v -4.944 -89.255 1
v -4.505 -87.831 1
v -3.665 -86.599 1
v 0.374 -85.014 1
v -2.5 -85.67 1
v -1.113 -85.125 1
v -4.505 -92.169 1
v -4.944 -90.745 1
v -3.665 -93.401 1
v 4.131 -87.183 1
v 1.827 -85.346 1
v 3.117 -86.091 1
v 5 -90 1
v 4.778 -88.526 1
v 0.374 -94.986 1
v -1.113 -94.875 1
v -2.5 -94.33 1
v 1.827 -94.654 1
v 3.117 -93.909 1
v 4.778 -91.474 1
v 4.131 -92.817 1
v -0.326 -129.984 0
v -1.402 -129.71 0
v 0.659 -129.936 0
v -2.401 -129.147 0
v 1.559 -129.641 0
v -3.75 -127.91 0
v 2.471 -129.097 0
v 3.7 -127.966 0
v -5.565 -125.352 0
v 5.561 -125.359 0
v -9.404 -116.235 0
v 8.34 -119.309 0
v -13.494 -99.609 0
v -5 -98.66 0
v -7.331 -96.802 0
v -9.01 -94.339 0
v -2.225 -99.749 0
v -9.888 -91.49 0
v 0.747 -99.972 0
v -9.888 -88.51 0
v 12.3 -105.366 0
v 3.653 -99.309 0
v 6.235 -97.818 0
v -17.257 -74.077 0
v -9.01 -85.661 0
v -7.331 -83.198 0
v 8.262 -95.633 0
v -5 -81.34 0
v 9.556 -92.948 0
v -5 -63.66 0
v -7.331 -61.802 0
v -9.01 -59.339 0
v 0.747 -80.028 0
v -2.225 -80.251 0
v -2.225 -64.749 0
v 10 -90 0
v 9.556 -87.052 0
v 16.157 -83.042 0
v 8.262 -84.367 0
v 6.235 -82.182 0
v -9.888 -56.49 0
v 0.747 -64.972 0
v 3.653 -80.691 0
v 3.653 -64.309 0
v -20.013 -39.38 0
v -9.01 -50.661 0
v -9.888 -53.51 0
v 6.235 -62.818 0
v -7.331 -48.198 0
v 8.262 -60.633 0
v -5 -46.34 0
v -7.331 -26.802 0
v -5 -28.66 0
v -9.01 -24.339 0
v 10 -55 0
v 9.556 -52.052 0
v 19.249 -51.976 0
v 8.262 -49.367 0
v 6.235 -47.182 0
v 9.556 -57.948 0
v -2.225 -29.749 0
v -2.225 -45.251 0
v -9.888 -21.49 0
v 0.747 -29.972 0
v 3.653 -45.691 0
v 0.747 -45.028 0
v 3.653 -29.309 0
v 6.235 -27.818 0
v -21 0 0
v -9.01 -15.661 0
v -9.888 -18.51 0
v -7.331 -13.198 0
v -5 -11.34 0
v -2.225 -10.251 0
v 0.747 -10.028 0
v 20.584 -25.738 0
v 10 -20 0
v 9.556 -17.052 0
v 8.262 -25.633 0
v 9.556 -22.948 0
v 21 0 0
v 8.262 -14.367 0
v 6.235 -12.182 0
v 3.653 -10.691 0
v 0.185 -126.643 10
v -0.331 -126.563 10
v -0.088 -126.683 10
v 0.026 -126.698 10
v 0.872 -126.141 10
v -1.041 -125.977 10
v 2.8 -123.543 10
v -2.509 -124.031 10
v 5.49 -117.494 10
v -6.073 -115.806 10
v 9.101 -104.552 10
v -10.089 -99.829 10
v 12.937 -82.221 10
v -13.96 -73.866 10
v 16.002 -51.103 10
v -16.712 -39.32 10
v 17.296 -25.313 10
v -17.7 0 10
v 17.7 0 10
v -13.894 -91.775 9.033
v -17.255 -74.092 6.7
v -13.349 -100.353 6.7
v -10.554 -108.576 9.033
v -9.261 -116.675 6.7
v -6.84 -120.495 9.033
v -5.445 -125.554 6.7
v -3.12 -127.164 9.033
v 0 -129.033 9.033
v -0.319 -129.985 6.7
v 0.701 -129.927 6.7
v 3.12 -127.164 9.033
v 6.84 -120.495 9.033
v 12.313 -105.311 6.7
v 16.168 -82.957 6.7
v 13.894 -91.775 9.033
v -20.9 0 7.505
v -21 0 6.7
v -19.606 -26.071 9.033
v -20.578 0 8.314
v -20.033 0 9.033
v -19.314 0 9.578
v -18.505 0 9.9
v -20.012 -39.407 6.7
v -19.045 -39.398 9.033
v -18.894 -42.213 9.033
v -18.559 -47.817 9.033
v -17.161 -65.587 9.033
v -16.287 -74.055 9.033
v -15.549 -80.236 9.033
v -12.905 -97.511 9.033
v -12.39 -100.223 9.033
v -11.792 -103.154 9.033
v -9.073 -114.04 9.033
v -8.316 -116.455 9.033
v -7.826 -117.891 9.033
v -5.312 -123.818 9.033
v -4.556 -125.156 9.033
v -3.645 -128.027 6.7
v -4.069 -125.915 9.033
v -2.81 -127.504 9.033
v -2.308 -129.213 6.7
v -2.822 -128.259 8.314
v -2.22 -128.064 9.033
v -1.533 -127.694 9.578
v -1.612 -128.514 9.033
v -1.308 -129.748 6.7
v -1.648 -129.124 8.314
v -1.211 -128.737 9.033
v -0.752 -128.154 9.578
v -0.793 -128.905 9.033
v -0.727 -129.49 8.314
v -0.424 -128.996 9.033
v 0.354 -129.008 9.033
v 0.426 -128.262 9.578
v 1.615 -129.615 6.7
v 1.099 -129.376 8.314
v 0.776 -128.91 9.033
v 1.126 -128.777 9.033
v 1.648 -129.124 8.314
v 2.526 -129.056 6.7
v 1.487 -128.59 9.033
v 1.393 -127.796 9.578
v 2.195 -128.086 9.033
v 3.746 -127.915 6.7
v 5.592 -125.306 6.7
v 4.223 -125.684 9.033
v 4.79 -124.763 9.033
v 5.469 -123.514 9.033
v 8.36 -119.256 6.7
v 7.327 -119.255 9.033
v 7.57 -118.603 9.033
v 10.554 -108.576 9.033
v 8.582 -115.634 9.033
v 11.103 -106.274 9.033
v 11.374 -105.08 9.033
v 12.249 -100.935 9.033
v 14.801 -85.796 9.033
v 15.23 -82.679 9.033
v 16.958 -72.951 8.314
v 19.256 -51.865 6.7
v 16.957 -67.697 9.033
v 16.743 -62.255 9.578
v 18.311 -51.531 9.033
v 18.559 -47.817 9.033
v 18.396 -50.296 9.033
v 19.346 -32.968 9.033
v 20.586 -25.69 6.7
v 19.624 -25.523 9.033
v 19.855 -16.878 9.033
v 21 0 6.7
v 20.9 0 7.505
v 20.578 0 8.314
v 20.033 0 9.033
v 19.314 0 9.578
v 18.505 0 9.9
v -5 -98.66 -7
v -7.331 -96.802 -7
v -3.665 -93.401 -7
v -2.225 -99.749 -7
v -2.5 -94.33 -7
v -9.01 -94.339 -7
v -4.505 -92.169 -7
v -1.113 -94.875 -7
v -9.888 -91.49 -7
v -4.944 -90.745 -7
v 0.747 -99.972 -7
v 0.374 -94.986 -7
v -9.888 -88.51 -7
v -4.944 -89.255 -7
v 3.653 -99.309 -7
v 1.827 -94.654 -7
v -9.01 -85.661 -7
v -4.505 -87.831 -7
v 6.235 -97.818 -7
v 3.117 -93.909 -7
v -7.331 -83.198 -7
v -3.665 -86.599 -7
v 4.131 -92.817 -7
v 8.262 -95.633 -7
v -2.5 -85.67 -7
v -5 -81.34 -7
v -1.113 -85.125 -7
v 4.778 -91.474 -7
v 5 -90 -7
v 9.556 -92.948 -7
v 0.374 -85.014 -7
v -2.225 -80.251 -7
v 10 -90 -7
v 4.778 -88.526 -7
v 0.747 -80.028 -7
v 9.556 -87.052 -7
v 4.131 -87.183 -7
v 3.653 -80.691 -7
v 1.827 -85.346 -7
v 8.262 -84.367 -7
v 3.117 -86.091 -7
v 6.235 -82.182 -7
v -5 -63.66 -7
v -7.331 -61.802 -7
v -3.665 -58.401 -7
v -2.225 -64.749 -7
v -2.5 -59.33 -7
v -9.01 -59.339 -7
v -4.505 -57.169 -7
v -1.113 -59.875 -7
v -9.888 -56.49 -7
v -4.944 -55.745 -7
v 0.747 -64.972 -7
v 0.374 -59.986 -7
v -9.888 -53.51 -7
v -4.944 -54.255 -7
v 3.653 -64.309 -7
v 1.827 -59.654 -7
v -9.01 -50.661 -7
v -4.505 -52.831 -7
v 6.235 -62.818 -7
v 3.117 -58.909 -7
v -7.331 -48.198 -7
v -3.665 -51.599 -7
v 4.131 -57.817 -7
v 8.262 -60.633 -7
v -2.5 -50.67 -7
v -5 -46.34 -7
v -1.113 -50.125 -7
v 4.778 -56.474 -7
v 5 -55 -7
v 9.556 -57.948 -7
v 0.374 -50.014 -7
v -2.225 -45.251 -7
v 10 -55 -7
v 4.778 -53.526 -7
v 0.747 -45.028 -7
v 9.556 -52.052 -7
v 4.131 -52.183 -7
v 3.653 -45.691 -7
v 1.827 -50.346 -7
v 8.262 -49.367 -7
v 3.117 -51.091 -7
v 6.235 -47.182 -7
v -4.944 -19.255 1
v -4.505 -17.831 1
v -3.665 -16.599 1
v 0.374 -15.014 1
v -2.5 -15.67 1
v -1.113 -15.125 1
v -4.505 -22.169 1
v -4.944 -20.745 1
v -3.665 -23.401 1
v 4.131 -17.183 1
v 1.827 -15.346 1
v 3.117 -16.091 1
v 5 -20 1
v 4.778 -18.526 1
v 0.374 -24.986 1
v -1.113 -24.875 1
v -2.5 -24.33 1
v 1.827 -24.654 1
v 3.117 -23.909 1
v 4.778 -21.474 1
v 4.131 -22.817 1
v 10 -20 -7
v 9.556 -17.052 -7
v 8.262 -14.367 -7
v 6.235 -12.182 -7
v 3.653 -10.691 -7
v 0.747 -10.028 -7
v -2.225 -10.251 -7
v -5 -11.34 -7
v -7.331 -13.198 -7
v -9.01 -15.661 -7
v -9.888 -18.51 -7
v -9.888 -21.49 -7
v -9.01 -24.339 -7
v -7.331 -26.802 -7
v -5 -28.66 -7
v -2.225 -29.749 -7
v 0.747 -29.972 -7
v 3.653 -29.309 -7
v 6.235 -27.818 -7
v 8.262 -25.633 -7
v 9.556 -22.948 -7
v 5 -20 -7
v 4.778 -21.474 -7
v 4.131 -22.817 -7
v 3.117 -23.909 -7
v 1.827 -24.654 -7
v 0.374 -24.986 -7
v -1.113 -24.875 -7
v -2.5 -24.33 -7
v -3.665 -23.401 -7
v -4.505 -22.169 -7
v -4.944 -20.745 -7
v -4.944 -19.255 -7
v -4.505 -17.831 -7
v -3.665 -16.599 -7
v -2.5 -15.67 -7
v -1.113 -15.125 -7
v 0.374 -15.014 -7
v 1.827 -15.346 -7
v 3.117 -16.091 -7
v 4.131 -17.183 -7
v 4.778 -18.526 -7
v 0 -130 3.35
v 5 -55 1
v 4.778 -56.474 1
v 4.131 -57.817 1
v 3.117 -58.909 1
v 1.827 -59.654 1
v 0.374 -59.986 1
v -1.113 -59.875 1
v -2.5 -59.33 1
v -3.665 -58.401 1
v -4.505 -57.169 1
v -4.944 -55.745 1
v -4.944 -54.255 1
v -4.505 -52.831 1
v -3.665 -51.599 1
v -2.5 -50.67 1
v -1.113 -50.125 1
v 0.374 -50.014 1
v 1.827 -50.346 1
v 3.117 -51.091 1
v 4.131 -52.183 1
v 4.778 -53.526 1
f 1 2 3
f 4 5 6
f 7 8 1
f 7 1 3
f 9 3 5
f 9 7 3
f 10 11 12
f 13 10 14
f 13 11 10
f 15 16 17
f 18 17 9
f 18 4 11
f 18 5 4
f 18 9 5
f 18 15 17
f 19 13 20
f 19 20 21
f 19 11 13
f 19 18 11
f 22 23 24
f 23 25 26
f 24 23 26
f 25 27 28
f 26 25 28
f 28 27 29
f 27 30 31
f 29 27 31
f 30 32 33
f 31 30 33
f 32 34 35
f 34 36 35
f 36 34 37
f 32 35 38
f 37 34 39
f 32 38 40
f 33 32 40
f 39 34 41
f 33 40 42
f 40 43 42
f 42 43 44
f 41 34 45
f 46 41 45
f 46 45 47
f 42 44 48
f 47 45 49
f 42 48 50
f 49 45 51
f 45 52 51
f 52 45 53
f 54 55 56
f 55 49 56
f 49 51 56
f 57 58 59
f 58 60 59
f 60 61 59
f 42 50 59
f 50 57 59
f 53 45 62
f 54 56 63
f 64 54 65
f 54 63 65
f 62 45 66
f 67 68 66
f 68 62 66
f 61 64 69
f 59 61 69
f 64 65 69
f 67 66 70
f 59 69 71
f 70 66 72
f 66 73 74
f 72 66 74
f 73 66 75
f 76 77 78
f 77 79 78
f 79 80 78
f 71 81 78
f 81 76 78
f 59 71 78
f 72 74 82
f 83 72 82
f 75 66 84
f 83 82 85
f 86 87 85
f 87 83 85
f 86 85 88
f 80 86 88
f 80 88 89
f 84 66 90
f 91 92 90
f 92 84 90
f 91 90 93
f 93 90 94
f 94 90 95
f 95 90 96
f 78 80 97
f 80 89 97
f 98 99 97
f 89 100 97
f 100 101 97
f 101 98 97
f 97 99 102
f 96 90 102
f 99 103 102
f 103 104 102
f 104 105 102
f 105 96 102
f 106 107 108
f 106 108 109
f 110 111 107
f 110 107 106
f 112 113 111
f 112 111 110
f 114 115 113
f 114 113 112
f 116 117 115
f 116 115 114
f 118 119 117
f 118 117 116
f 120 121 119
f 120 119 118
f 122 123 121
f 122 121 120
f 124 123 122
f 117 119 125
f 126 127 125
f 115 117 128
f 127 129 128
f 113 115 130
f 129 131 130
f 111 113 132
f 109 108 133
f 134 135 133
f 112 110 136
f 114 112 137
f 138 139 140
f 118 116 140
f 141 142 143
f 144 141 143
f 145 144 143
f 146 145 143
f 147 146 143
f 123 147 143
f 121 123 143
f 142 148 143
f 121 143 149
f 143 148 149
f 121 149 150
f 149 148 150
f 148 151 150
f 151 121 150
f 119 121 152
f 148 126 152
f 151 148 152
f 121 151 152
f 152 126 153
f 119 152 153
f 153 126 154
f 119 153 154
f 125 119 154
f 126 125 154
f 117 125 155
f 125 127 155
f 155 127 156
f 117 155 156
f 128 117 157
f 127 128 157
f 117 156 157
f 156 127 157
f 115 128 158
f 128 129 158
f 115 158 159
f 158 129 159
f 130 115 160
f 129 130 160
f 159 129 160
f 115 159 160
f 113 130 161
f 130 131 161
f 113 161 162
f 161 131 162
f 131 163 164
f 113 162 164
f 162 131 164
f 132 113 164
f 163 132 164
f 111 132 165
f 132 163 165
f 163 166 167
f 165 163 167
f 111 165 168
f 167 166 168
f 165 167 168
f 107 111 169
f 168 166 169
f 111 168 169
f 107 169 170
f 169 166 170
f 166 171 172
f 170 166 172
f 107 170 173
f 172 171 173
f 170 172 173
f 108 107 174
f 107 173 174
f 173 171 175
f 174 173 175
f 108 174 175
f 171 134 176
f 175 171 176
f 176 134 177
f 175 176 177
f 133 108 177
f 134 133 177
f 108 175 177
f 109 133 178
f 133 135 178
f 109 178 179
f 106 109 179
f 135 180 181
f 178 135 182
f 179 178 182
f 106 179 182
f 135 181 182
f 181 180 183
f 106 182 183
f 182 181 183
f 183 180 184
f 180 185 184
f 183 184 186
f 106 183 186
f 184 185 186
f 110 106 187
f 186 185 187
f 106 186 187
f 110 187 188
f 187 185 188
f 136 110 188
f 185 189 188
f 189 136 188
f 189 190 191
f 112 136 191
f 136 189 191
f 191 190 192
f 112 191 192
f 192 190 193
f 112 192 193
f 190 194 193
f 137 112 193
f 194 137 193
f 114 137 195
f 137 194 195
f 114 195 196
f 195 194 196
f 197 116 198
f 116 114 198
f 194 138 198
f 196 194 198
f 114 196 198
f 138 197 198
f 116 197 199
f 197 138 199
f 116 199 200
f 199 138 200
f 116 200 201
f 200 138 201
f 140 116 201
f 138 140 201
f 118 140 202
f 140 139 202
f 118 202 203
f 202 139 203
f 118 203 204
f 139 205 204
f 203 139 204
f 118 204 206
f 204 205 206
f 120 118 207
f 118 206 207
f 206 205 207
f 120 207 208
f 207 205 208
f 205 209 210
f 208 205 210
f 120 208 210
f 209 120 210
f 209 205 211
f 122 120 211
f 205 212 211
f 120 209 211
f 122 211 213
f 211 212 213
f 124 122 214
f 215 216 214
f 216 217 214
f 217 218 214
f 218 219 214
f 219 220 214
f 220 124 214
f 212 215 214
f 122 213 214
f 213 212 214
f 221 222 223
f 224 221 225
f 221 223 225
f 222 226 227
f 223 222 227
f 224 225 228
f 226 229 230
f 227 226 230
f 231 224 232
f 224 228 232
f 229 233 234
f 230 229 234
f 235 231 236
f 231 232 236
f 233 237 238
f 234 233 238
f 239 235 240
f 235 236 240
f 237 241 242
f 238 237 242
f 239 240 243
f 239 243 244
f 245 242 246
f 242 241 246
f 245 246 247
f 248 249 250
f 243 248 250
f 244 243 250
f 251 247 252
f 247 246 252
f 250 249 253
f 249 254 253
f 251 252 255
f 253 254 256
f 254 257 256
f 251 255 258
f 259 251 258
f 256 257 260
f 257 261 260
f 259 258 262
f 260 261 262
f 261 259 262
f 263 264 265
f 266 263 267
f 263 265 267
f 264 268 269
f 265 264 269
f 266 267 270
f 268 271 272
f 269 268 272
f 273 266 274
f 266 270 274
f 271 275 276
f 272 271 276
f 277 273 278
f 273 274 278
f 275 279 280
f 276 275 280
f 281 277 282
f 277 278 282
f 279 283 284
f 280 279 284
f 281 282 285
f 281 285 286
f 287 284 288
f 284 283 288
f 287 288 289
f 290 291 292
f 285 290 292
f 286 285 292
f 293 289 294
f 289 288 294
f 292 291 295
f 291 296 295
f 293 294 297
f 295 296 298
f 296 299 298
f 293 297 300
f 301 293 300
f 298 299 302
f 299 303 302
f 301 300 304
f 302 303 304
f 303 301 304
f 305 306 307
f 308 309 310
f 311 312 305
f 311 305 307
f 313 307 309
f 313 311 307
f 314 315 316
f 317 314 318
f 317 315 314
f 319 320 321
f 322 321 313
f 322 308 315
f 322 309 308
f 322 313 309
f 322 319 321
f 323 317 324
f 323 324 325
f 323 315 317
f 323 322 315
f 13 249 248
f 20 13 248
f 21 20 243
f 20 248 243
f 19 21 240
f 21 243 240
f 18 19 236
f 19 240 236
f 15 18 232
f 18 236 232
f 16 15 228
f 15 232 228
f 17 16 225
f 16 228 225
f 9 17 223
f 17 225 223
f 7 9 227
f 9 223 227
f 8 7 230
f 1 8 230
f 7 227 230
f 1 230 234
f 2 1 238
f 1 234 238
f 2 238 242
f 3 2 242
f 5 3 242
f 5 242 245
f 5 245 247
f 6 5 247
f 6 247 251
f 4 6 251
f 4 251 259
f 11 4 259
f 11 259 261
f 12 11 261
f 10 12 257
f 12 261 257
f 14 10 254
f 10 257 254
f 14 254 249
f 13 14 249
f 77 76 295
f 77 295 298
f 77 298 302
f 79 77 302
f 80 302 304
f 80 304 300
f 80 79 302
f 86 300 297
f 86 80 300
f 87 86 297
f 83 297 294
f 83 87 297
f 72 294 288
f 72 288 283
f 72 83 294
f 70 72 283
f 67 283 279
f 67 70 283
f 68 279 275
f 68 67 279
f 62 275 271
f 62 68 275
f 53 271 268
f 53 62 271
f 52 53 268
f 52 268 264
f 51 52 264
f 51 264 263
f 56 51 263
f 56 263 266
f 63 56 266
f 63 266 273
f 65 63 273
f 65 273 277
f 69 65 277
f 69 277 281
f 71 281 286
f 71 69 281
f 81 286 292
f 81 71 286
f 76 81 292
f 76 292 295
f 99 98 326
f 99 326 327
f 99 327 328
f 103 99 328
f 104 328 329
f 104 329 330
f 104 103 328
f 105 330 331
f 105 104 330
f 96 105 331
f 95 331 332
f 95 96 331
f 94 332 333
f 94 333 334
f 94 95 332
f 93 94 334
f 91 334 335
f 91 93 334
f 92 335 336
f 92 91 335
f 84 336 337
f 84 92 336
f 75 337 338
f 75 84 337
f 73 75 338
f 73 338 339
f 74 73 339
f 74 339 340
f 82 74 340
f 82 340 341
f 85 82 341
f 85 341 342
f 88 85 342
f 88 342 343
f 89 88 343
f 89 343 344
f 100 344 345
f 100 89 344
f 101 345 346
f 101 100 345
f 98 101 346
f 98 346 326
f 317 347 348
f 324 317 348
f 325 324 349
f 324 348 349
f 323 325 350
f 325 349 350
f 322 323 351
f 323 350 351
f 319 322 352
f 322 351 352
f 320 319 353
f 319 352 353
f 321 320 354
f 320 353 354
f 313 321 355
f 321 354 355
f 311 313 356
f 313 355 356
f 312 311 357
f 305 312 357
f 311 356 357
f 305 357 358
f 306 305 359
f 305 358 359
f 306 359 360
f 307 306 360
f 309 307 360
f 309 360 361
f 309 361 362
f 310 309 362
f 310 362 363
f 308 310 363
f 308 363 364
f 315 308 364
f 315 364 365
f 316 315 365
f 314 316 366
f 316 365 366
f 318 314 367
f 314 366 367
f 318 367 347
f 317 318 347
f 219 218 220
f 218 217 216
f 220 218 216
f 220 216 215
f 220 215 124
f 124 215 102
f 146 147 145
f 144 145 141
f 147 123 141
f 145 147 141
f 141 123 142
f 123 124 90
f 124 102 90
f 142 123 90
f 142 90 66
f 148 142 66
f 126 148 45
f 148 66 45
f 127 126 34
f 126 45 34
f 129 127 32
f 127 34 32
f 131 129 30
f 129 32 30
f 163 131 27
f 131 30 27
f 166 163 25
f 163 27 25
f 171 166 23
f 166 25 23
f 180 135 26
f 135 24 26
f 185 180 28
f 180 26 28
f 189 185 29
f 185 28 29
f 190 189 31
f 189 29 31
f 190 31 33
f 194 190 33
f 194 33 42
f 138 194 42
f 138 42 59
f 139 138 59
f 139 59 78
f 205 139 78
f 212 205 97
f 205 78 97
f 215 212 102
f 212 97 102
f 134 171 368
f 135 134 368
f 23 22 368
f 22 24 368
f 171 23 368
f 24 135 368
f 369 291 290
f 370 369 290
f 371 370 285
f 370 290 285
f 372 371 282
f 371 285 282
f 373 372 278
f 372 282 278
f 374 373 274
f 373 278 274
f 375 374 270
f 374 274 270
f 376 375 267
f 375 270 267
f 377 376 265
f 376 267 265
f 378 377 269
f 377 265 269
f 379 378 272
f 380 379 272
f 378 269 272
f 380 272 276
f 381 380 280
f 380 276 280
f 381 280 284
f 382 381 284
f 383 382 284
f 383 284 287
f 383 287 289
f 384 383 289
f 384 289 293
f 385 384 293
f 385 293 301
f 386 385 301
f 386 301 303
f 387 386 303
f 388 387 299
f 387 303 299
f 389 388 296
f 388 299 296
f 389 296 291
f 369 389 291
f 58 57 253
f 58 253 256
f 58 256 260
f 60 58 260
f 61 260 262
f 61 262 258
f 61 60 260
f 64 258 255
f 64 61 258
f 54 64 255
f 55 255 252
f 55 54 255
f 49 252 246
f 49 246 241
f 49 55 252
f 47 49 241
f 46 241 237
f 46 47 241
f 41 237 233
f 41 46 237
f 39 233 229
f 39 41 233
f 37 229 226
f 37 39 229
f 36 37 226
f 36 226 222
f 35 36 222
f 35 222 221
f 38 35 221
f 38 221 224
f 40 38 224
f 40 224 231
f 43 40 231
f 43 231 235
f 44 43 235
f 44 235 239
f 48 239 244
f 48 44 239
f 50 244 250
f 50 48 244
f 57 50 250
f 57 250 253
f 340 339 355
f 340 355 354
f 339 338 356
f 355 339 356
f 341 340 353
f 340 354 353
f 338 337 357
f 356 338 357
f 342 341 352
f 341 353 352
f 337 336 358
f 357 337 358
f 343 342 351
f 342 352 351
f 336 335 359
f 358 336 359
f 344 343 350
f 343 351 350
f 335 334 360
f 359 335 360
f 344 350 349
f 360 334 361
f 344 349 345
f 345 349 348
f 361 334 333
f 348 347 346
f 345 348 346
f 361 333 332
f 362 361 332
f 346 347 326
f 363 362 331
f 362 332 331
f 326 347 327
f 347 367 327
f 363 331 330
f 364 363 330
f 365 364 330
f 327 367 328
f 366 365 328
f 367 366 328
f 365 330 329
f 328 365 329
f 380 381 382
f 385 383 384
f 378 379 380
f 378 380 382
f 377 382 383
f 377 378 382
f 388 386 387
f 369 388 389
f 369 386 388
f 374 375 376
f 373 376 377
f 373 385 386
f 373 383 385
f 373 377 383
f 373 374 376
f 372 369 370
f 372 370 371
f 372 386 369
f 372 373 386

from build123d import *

# Parameters (mm, degrees)
PAD_DEPTH           = 10
FILLET001_R         = 3.3
SKETCH005_R         = 10
PAD003_DEPTH        = 7
SKETCH006_R         = 5
POCKET_DEPTH        = 8
LINEARPATTERN_COUNT = 3
LINEARPATTERN_PITCH = 35


with BuildPart() as part:
    # Sketch → Pad (new body)
    with BuildSketch(Plane.XY):
        with BuildLine():
            add(Edge.make_bspline(
                [(-21, 0), (-21, -130), (0, -130), (21, -130), (21, 0)],
                knots=[4.712389, 4.712389, 4.712389, 6.283185, 6.283185, 7.853982, 7.853982, 7.853982], degree=2, weights=[1, 0.707107, 1, 0.707107, 1]))
            Line((21, 0), (-21, 0))
        make_face()
    extrude(amount=PAD_DEPTH)

    # Fillet001
    fillet001_edges = [part.edges().sort_by_distance(p)[0] for p in [
        (0.349656, -129.981979, 10),
    ]]
    fillet(fillet001_edges, radius=FILLET001_R)

    # Sketch005 → Pad003 (join)
    with BuildSketch(Plane.XY):
        with Locations((0, -90)):
            Circle(SKETCH005_R)
    pad003 = extrude(amount=-PAD003_DEPTH)

    # Sketch006 (on Face7 of Pad003) → Pocket (cut)
    with BuildSketch(Plane(origin=(0, 0, -7), x_dir=(1, 0, 0), z_dir=(0, 0, -1))):
        with Locations((0, 90)):
            Circle(SKETCH006_R)
    pocket = extrude(amount=-POCKET_DEPTH, mode=Mode.SUBTRACT)

    # LinearPattern: Pad003, Pocket ×3
    with Locations(*[(0, i * LINEARPATTERN_PITCH, 0) for i in range(1, LINEARPATTERN_COUNT)]):
        add(pad003)
        add(pocket, mode=Mode.SUBTRACT)


solid = part.part
